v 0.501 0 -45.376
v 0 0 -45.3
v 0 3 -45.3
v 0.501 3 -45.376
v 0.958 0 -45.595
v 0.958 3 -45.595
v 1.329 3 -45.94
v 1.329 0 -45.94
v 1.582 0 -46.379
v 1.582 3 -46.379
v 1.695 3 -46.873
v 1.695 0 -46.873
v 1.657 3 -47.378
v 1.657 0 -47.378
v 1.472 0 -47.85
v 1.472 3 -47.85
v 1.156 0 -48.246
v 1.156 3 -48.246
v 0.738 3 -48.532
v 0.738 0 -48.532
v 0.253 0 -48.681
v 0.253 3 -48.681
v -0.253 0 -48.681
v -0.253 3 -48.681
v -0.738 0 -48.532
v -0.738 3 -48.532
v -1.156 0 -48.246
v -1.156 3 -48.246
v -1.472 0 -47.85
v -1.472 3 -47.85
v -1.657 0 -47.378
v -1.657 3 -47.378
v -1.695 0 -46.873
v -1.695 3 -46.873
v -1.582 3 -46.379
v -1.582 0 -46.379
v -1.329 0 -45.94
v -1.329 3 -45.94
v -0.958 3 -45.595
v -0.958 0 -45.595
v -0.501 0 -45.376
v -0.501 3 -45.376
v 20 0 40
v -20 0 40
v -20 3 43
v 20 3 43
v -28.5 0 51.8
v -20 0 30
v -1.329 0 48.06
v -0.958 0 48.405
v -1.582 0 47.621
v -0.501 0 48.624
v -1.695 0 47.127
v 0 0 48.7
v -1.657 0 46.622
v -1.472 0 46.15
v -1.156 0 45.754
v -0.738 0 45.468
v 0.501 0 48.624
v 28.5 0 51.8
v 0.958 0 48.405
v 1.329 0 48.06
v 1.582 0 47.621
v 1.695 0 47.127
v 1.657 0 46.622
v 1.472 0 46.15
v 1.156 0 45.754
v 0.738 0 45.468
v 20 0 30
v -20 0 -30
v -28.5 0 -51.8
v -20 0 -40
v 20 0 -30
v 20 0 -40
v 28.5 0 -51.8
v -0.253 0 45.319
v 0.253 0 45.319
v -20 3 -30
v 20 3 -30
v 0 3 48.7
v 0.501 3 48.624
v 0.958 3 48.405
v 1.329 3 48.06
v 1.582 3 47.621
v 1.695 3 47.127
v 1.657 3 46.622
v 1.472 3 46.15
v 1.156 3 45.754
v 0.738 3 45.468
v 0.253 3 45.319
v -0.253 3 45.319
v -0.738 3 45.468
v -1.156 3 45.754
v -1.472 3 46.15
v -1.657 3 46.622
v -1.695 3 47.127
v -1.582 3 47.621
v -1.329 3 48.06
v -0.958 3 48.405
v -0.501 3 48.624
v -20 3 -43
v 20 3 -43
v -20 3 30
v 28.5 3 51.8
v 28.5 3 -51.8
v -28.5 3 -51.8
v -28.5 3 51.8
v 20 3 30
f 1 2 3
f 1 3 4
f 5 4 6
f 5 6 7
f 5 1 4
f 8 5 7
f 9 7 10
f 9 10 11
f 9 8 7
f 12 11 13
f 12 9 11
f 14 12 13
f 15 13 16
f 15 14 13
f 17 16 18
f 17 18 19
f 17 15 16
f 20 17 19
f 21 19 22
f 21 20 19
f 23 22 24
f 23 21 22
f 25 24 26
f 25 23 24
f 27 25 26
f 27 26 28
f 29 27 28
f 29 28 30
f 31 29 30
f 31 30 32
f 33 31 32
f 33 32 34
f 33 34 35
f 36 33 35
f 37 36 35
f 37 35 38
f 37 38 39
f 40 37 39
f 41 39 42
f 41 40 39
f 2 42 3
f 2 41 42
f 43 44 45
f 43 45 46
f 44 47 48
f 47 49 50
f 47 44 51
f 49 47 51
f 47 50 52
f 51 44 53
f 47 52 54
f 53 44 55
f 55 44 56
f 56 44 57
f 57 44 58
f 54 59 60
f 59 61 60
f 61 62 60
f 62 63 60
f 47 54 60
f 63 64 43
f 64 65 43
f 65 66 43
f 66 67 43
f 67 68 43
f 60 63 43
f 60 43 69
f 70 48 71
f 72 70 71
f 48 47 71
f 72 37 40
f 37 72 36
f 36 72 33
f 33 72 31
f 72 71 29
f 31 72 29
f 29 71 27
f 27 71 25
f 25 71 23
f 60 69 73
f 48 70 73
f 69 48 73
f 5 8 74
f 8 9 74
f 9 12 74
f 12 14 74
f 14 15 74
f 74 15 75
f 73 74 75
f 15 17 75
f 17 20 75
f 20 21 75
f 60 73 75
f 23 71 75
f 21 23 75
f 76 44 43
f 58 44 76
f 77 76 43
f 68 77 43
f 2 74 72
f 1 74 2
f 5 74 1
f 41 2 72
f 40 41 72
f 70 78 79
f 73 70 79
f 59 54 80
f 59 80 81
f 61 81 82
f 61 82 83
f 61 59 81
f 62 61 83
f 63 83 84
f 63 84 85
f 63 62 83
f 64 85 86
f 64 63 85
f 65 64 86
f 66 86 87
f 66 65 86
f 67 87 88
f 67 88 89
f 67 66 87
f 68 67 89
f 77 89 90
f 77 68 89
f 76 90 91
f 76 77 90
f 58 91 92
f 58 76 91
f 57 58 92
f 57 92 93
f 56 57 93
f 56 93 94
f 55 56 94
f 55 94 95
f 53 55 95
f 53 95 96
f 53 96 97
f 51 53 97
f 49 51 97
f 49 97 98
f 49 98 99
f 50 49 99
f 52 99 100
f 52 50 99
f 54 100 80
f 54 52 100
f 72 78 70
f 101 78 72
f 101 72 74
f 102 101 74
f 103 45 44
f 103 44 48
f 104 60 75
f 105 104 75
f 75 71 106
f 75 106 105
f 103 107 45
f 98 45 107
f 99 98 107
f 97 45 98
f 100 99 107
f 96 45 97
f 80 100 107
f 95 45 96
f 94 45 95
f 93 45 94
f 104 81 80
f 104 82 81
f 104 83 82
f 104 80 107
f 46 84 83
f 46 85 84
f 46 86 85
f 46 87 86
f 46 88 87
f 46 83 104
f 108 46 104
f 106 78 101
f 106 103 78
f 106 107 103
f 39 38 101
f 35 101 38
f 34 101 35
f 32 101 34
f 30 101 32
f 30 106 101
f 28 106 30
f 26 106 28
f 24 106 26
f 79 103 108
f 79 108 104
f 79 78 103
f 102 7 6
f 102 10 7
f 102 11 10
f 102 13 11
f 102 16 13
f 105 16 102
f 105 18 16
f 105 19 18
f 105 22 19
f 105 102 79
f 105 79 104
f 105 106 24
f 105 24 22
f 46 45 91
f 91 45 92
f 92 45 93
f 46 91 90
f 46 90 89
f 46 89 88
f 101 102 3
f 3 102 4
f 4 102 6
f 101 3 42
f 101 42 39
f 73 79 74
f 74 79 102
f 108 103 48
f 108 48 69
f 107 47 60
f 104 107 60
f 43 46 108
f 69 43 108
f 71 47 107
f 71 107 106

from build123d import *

# Parameters (mm, degrees)
SKETCH_1_W          = 57
SKETCH_1_H          = 103.6
SKETCH_1_R          = 1.7
EXTRUDE_1_DEPTH     = 3
SKETCH_2_W          = 40
SKETCH_2_H          = 10
CUT_EXTRUDE_1_DEPTH = 3
CHAMFER_1_SIZE      = 3


with BuildPart() as part:
    # 草图1 → 凸台-拉伸1 (new body)
    with BuildSketch(Plane(origin=(0, 0, 0), x_dir=(1, 0, 0), z_dir=(0, 1, 0))):
        Rectangle(SKETCH_1_W, SKETCH_1_H)
        with Locations(Location((0, 47, 0), (0, 0, 270))):
            Circle(SKETCH_1_R, mode=Mode.SUBTRACT)
        with Locations(Location((0, -47, 0), (0, 0, 270))):
            Circle(SKETCH_1_R, mode=Mode.SUBTRACT)
    extrude(amount=EXTRUDE_1_DEPTH)

    # 草图2 → 切除-拉伸1 (cut)
    with BuildSketch(Plane(origin=(0, 3, 0), x_dir=(1, 0, 0), z_dir=(0, 1, 0))):
        with Locations((0, 35)):
            Rectangle(SKETCH_2_W, SKETCH_2_H)
        with Locations((0, -35)):
            Rectangle(SKETCH_2_W, SKETCH_2_H)
    extrude(amount=-CUT_EXTRUDE_1_DEPTH, mode=Mode.SUBTRACT)

    # 倒角1
    chamfer_1_edges = [part.edges().sort_by_distance(p)[0] for p in [
        (0, 3, 40),
        (0, 3, -40),
    ]]
    chamfer(chamfer_1_edges, length=CHAMFER_1_SIZE - 0.0001)  # a hair under: the kernel refuses the full size


solid = part.part
